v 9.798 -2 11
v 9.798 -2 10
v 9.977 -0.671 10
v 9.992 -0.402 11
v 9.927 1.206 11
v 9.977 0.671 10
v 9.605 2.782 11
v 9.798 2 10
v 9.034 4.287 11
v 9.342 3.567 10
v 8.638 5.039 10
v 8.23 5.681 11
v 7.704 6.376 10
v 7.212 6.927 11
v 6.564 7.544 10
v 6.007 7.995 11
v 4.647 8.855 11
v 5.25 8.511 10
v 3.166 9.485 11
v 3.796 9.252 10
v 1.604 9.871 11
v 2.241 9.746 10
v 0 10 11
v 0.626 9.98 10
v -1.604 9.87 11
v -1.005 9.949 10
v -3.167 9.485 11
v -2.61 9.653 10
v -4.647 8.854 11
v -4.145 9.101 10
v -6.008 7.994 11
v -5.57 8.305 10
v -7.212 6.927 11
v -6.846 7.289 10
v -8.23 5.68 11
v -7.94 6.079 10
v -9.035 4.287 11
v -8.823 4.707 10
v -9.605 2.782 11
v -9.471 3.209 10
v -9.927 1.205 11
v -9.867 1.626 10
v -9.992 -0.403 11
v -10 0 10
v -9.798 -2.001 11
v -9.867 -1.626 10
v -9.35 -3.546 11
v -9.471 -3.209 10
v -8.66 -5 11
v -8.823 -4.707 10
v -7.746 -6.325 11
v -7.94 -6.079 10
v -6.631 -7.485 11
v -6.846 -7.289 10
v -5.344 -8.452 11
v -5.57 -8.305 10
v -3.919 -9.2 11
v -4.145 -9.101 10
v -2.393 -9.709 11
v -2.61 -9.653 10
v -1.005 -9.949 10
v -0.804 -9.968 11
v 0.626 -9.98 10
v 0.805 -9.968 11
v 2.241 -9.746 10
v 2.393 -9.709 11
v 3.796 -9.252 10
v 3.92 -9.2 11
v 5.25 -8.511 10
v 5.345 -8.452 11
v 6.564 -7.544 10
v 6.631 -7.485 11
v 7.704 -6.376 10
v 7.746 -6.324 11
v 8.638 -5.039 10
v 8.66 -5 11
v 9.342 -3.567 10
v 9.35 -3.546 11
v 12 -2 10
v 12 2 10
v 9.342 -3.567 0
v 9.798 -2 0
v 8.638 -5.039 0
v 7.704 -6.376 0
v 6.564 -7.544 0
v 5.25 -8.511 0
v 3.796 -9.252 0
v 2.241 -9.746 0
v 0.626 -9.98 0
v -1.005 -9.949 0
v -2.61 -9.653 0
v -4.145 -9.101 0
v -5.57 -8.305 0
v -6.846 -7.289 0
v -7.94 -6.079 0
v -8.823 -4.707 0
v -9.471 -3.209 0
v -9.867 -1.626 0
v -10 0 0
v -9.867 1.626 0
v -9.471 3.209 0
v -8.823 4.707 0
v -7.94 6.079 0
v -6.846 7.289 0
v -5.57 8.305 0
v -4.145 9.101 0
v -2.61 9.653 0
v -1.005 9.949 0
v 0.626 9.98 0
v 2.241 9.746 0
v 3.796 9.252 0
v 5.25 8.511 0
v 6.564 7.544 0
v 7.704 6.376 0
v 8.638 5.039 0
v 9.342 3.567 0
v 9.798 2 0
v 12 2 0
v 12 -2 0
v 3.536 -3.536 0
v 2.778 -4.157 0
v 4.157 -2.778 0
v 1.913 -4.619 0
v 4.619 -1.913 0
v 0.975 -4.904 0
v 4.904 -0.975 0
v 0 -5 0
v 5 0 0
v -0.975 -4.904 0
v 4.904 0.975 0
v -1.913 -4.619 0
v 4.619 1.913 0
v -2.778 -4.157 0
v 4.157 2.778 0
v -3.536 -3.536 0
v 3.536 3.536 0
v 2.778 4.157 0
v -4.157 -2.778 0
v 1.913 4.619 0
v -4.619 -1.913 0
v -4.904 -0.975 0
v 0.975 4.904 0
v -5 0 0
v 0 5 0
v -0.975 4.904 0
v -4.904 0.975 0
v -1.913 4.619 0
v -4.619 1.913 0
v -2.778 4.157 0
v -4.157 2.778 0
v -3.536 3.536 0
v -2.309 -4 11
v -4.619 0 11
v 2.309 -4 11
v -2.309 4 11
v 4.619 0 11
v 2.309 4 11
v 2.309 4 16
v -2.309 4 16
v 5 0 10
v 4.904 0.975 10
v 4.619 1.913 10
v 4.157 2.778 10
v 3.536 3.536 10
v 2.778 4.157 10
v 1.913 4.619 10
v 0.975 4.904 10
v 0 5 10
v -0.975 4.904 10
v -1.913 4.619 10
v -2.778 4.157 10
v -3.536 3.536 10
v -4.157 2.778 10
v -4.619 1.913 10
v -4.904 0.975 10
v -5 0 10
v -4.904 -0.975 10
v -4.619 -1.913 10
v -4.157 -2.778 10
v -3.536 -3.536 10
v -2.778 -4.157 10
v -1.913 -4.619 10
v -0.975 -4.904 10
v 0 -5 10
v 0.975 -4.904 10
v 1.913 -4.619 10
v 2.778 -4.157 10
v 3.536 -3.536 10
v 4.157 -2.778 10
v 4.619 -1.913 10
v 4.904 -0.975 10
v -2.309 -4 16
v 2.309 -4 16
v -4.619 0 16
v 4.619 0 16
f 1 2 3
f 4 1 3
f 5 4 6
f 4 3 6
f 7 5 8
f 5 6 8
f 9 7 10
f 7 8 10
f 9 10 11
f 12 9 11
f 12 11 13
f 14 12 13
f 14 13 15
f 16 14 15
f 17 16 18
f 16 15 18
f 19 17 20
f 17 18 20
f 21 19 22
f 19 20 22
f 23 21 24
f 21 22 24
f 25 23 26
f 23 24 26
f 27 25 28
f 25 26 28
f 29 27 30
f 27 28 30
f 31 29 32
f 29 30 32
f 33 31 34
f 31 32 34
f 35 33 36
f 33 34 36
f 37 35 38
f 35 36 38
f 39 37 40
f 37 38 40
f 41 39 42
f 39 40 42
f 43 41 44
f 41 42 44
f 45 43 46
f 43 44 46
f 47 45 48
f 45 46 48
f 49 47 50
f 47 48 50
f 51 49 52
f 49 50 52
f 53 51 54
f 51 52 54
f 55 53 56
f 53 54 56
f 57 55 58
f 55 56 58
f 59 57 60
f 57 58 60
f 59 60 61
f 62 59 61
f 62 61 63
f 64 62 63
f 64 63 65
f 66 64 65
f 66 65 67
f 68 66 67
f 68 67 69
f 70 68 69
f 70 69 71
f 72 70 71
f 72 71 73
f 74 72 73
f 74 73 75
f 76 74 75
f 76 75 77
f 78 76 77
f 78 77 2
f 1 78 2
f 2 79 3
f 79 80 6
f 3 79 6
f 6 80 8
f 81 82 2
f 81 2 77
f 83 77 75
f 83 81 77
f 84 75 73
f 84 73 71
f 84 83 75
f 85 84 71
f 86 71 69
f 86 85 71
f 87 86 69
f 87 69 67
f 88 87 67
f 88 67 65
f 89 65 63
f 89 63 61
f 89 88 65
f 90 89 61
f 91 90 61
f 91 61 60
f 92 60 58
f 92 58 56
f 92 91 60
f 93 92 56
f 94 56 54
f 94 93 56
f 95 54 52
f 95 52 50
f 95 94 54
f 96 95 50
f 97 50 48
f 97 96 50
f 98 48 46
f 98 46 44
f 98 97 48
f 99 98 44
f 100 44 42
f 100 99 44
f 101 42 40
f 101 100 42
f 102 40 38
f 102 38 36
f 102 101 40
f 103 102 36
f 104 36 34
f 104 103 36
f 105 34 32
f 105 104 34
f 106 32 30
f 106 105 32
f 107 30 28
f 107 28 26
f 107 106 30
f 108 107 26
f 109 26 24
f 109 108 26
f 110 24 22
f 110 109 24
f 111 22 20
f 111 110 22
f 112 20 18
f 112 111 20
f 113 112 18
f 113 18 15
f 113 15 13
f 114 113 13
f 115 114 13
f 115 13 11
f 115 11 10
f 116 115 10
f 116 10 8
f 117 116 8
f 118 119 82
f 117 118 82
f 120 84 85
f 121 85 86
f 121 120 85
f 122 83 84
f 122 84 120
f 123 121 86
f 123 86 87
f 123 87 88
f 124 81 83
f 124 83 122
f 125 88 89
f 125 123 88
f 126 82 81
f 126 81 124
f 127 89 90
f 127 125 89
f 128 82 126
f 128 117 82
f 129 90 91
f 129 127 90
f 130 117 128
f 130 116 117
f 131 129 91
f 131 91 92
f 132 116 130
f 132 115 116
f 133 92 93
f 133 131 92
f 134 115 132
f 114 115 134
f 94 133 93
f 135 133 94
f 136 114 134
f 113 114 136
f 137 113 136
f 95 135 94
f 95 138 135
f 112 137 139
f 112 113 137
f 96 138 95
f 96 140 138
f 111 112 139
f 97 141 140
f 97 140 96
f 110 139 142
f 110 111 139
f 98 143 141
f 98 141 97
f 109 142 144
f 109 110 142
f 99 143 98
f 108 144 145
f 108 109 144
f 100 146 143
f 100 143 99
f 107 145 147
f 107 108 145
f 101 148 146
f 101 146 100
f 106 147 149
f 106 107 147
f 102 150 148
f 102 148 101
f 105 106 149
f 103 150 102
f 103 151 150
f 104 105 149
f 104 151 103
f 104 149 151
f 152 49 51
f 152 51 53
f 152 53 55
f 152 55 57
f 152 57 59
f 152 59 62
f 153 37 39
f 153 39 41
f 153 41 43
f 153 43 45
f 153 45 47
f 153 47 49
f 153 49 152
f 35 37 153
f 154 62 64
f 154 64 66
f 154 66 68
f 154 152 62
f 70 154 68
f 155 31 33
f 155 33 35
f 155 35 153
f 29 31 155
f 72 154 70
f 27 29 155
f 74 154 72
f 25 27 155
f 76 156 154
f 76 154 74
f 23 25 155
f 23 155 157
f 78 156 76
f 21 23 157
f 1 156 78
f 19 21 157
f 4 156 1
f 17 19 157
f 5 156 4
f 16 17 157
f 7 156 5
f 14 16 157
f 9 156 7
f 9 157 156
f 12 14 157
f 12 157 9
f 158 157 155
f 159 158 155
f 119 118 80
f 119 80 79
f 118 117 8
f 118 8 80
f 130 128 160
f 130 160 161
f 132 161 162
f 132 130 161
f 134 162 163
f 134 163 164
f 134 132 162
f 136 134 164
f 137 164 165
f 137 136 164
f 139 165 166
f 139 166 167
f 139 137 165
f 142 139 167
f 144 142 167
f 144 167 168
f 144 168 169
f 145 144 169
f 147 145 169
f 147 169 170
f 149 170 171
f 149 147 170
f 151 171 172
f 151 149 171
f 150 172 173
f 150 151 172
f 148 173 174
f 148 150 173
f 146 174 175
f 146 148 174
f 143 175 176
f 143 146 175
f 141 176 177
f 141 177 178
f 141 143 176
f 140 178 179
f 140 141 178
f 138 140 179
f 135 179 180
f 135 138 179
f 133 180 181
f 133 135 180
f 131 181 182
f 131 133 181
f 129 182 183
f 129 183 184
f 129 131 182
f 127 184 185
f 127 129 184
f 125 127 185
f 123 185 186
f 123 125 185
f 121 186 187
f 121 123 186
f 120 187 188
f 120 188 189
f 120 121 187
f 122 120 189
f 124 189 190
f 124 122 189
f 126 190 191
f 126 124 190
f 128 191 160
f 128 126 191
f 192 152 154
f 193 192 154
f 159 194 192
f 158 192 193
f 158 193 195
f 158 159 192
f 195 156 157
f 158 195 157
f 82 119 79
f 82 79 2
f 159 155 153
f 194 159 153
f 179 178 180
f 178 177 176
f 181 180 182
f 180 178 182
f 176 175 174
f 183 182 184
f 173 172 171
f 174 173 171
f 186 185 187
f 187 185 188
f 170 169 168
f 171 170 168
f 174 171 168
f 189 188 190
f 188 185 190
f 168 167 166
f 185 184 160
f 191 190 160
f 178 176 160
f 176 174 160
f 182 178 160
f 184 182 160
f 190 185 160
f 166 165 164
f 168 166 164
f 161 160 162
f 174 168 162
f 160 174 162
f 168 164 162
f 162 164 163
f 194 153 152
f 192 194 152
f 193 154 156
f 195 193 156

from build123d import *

# Parameters (mm, degrees)
SKETCH1_R           = 5
BOSS_EXTRUDE1_DEPTH = 10
SKETCH2_R           = 10
BOSS_EXTRUDE2_DEPTH = 1
BOSS_EXTRUDE3_DEPTH = 5


with BuildPart() as part:
    # Sketch1 → Boss-Extrude1 (new body)
    with BuildSketch(Plane.XY):
        with BuildLine():
            Line((12, 2), (12, -2))
            Line((12, -2), (9.797958971, -2))
            ThreePointArc((9.797958971, -2), (-10, 0), (9.797958971, 2))
            Line((9.797958971, 2), (12, 2))
        make_face()
        Circle(SKETCH1_R, mode=Mode.SUBTRACT)
    extrude(amount=BOSS_EXTRUDE1_DEPTH)

    # Sketch2 → Boss-Extrude2 (add)
    with BuildSketch(Plane.XY.offset(10)):
        with Locations(Location((0, 0, 0), (0, 0, 348.463040967))):
            Circle(SKETCH2_R)
    extrude(amount=BOSS_EXTRUDE2_DEPTH)

    # Sketch3 → Boss-Extrude3 (add)
    with BuildSketch(Plane.XY.offset(11)):
        Polygon((4.618802154, 0), (2.309401077, 4), (-2.309401077, 4), (-4.618802154, 0), (-2.309401077, -4), (2.309401077, -4), align=None)
    extrude(amount=BOSS_EXTRUDE3_DEPTH)


solid = part.part
